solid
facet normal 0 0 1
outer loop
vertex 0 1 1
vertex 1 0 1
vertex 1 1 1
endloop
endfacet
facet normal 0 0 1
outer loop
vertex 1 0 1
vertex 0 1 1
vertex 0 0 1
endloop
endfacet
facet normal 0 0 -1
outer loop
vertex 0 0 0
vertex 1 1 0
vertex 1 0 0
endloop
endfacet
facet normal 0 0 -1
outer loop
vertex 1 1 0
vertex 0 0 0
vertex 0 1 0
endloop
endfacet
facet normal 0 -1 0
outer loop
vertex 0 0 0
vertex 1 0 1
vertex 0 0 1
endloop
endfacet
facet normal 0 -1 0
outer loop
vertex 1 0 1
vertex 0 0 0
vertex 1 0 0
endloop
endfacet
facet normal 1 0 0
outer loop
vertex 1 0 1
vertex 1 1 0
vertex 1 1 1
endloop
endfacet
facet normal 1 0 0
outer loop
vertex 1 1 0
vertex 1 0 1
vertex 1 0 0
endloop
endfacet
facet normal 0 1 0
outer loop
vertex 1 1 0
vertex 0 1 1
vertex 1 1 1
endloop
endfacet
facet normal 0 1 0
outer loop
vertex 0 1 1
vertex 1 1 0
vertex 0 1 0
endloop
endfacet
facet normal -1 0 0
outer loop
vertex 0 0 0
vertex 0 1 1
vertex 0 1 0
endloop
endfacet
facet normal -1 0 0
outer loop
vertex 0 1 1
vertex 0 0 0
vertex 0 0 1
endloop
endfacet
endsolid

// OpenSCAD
use <fonts.scad>;

num_list=[-1,-2,9,8,7,6,5,4,3,2,1,0];
points_list=[[-7,-6],[5,-4],[3,2],[-1,0]];

function sum(num_list,index) = index > 0 ? (num_list[index]+sum(num_list,index-1)) : num_list[index];

function make_array(num_list,i) = i>0 ? ([num_list[i],make_array(num_list,i-1)]) : num_list[i];

function list_sum(num_list,i) = i>0 ? (
	( len(num_list[i])>0 ? num_list[i][0]+list_sum(num_list[i],len(num_list[i])-1) : num_list[i]) )
	: num_list[i];

function compare_char(ch1,ch2,match_val) = ch1==ch2 ? match_val : 0;

function find_font_char_list(ch,font,i) = i>0 ?
	[(font[2][i][1]==ch ? i : 0),find_font_char_list(ch,font,i-1)]
    : 0 ;

function find_font_char(ch,font,i) = i<len(font[2])-1 ?
	find_font_char(ch,font,i+1)+(font[2][i][1]==ch ? i : 0)
    : font[2][0][0];

function min_x(points,i) = i <len(points)-1 ?
  ( points[i][0]<min_x(points,i+1) ? points[i][0] : min_x(points,i+1) ) : points[i][0];

function max_x(points,i) = i <len(points)-1 ?
  (points[i][0]>max_x(points,i+1) ? points[i][0] : max_x(points,i+1)) : points[i][0];

function min_y(points,i) = i <len(points)-1 ?
  ( points[i][1]<min_y(points,i+1) ? points[i][1] : min_y(points,i+1) ) : points[i][1];

function max_y(points,i) = i <len(points)-1 ?
  (points[i][1]>max_y(points,i+1) ? points[i][1] : max_y(points,i+1)) : points[i][1];

module test_vars() {
  current_val=0;
  for(i=[0:9]) assign(current_val=sum(num_list,i)) {
	echo(str("Current sum for ",i," with sum_list[i]=",num_list[i]," : ",current_val));
  }
  this_array=make_array(num_list,len(num_list)-1);
  echo(str("Make array:",this_array ) );
  echo(str("List sum:",list_sum(this_array,len(this_array)-1)));
  this_font=8bit_polyfont();
  char_index_list=find_font_char_list("A",this_font,len(this_font[2])-1);
  char_index_A=list_sum(char_index_list,len(char_index_list)-1);
  echo(str("Find 'A' : ",char_index_A));
  echo(this_font[2][char_index_A]);
  char_index_B=find_font_char("B",this_font,0);
  echo(str("Find 'B' : ",char_index_B));
  echo(this_font[2][char_index_B]);
  echo(str("Minimum X: ",min_x(points_list,0) ));
  echo(str("Maximum X: ",max_x(points_list,0) ));
  echo(str("Minimum Y: ",min_y(points_list,0) ));
  echo(str("Maximum Y: ",max_y(points_list,0) ));
}

cube();
test_vars();
